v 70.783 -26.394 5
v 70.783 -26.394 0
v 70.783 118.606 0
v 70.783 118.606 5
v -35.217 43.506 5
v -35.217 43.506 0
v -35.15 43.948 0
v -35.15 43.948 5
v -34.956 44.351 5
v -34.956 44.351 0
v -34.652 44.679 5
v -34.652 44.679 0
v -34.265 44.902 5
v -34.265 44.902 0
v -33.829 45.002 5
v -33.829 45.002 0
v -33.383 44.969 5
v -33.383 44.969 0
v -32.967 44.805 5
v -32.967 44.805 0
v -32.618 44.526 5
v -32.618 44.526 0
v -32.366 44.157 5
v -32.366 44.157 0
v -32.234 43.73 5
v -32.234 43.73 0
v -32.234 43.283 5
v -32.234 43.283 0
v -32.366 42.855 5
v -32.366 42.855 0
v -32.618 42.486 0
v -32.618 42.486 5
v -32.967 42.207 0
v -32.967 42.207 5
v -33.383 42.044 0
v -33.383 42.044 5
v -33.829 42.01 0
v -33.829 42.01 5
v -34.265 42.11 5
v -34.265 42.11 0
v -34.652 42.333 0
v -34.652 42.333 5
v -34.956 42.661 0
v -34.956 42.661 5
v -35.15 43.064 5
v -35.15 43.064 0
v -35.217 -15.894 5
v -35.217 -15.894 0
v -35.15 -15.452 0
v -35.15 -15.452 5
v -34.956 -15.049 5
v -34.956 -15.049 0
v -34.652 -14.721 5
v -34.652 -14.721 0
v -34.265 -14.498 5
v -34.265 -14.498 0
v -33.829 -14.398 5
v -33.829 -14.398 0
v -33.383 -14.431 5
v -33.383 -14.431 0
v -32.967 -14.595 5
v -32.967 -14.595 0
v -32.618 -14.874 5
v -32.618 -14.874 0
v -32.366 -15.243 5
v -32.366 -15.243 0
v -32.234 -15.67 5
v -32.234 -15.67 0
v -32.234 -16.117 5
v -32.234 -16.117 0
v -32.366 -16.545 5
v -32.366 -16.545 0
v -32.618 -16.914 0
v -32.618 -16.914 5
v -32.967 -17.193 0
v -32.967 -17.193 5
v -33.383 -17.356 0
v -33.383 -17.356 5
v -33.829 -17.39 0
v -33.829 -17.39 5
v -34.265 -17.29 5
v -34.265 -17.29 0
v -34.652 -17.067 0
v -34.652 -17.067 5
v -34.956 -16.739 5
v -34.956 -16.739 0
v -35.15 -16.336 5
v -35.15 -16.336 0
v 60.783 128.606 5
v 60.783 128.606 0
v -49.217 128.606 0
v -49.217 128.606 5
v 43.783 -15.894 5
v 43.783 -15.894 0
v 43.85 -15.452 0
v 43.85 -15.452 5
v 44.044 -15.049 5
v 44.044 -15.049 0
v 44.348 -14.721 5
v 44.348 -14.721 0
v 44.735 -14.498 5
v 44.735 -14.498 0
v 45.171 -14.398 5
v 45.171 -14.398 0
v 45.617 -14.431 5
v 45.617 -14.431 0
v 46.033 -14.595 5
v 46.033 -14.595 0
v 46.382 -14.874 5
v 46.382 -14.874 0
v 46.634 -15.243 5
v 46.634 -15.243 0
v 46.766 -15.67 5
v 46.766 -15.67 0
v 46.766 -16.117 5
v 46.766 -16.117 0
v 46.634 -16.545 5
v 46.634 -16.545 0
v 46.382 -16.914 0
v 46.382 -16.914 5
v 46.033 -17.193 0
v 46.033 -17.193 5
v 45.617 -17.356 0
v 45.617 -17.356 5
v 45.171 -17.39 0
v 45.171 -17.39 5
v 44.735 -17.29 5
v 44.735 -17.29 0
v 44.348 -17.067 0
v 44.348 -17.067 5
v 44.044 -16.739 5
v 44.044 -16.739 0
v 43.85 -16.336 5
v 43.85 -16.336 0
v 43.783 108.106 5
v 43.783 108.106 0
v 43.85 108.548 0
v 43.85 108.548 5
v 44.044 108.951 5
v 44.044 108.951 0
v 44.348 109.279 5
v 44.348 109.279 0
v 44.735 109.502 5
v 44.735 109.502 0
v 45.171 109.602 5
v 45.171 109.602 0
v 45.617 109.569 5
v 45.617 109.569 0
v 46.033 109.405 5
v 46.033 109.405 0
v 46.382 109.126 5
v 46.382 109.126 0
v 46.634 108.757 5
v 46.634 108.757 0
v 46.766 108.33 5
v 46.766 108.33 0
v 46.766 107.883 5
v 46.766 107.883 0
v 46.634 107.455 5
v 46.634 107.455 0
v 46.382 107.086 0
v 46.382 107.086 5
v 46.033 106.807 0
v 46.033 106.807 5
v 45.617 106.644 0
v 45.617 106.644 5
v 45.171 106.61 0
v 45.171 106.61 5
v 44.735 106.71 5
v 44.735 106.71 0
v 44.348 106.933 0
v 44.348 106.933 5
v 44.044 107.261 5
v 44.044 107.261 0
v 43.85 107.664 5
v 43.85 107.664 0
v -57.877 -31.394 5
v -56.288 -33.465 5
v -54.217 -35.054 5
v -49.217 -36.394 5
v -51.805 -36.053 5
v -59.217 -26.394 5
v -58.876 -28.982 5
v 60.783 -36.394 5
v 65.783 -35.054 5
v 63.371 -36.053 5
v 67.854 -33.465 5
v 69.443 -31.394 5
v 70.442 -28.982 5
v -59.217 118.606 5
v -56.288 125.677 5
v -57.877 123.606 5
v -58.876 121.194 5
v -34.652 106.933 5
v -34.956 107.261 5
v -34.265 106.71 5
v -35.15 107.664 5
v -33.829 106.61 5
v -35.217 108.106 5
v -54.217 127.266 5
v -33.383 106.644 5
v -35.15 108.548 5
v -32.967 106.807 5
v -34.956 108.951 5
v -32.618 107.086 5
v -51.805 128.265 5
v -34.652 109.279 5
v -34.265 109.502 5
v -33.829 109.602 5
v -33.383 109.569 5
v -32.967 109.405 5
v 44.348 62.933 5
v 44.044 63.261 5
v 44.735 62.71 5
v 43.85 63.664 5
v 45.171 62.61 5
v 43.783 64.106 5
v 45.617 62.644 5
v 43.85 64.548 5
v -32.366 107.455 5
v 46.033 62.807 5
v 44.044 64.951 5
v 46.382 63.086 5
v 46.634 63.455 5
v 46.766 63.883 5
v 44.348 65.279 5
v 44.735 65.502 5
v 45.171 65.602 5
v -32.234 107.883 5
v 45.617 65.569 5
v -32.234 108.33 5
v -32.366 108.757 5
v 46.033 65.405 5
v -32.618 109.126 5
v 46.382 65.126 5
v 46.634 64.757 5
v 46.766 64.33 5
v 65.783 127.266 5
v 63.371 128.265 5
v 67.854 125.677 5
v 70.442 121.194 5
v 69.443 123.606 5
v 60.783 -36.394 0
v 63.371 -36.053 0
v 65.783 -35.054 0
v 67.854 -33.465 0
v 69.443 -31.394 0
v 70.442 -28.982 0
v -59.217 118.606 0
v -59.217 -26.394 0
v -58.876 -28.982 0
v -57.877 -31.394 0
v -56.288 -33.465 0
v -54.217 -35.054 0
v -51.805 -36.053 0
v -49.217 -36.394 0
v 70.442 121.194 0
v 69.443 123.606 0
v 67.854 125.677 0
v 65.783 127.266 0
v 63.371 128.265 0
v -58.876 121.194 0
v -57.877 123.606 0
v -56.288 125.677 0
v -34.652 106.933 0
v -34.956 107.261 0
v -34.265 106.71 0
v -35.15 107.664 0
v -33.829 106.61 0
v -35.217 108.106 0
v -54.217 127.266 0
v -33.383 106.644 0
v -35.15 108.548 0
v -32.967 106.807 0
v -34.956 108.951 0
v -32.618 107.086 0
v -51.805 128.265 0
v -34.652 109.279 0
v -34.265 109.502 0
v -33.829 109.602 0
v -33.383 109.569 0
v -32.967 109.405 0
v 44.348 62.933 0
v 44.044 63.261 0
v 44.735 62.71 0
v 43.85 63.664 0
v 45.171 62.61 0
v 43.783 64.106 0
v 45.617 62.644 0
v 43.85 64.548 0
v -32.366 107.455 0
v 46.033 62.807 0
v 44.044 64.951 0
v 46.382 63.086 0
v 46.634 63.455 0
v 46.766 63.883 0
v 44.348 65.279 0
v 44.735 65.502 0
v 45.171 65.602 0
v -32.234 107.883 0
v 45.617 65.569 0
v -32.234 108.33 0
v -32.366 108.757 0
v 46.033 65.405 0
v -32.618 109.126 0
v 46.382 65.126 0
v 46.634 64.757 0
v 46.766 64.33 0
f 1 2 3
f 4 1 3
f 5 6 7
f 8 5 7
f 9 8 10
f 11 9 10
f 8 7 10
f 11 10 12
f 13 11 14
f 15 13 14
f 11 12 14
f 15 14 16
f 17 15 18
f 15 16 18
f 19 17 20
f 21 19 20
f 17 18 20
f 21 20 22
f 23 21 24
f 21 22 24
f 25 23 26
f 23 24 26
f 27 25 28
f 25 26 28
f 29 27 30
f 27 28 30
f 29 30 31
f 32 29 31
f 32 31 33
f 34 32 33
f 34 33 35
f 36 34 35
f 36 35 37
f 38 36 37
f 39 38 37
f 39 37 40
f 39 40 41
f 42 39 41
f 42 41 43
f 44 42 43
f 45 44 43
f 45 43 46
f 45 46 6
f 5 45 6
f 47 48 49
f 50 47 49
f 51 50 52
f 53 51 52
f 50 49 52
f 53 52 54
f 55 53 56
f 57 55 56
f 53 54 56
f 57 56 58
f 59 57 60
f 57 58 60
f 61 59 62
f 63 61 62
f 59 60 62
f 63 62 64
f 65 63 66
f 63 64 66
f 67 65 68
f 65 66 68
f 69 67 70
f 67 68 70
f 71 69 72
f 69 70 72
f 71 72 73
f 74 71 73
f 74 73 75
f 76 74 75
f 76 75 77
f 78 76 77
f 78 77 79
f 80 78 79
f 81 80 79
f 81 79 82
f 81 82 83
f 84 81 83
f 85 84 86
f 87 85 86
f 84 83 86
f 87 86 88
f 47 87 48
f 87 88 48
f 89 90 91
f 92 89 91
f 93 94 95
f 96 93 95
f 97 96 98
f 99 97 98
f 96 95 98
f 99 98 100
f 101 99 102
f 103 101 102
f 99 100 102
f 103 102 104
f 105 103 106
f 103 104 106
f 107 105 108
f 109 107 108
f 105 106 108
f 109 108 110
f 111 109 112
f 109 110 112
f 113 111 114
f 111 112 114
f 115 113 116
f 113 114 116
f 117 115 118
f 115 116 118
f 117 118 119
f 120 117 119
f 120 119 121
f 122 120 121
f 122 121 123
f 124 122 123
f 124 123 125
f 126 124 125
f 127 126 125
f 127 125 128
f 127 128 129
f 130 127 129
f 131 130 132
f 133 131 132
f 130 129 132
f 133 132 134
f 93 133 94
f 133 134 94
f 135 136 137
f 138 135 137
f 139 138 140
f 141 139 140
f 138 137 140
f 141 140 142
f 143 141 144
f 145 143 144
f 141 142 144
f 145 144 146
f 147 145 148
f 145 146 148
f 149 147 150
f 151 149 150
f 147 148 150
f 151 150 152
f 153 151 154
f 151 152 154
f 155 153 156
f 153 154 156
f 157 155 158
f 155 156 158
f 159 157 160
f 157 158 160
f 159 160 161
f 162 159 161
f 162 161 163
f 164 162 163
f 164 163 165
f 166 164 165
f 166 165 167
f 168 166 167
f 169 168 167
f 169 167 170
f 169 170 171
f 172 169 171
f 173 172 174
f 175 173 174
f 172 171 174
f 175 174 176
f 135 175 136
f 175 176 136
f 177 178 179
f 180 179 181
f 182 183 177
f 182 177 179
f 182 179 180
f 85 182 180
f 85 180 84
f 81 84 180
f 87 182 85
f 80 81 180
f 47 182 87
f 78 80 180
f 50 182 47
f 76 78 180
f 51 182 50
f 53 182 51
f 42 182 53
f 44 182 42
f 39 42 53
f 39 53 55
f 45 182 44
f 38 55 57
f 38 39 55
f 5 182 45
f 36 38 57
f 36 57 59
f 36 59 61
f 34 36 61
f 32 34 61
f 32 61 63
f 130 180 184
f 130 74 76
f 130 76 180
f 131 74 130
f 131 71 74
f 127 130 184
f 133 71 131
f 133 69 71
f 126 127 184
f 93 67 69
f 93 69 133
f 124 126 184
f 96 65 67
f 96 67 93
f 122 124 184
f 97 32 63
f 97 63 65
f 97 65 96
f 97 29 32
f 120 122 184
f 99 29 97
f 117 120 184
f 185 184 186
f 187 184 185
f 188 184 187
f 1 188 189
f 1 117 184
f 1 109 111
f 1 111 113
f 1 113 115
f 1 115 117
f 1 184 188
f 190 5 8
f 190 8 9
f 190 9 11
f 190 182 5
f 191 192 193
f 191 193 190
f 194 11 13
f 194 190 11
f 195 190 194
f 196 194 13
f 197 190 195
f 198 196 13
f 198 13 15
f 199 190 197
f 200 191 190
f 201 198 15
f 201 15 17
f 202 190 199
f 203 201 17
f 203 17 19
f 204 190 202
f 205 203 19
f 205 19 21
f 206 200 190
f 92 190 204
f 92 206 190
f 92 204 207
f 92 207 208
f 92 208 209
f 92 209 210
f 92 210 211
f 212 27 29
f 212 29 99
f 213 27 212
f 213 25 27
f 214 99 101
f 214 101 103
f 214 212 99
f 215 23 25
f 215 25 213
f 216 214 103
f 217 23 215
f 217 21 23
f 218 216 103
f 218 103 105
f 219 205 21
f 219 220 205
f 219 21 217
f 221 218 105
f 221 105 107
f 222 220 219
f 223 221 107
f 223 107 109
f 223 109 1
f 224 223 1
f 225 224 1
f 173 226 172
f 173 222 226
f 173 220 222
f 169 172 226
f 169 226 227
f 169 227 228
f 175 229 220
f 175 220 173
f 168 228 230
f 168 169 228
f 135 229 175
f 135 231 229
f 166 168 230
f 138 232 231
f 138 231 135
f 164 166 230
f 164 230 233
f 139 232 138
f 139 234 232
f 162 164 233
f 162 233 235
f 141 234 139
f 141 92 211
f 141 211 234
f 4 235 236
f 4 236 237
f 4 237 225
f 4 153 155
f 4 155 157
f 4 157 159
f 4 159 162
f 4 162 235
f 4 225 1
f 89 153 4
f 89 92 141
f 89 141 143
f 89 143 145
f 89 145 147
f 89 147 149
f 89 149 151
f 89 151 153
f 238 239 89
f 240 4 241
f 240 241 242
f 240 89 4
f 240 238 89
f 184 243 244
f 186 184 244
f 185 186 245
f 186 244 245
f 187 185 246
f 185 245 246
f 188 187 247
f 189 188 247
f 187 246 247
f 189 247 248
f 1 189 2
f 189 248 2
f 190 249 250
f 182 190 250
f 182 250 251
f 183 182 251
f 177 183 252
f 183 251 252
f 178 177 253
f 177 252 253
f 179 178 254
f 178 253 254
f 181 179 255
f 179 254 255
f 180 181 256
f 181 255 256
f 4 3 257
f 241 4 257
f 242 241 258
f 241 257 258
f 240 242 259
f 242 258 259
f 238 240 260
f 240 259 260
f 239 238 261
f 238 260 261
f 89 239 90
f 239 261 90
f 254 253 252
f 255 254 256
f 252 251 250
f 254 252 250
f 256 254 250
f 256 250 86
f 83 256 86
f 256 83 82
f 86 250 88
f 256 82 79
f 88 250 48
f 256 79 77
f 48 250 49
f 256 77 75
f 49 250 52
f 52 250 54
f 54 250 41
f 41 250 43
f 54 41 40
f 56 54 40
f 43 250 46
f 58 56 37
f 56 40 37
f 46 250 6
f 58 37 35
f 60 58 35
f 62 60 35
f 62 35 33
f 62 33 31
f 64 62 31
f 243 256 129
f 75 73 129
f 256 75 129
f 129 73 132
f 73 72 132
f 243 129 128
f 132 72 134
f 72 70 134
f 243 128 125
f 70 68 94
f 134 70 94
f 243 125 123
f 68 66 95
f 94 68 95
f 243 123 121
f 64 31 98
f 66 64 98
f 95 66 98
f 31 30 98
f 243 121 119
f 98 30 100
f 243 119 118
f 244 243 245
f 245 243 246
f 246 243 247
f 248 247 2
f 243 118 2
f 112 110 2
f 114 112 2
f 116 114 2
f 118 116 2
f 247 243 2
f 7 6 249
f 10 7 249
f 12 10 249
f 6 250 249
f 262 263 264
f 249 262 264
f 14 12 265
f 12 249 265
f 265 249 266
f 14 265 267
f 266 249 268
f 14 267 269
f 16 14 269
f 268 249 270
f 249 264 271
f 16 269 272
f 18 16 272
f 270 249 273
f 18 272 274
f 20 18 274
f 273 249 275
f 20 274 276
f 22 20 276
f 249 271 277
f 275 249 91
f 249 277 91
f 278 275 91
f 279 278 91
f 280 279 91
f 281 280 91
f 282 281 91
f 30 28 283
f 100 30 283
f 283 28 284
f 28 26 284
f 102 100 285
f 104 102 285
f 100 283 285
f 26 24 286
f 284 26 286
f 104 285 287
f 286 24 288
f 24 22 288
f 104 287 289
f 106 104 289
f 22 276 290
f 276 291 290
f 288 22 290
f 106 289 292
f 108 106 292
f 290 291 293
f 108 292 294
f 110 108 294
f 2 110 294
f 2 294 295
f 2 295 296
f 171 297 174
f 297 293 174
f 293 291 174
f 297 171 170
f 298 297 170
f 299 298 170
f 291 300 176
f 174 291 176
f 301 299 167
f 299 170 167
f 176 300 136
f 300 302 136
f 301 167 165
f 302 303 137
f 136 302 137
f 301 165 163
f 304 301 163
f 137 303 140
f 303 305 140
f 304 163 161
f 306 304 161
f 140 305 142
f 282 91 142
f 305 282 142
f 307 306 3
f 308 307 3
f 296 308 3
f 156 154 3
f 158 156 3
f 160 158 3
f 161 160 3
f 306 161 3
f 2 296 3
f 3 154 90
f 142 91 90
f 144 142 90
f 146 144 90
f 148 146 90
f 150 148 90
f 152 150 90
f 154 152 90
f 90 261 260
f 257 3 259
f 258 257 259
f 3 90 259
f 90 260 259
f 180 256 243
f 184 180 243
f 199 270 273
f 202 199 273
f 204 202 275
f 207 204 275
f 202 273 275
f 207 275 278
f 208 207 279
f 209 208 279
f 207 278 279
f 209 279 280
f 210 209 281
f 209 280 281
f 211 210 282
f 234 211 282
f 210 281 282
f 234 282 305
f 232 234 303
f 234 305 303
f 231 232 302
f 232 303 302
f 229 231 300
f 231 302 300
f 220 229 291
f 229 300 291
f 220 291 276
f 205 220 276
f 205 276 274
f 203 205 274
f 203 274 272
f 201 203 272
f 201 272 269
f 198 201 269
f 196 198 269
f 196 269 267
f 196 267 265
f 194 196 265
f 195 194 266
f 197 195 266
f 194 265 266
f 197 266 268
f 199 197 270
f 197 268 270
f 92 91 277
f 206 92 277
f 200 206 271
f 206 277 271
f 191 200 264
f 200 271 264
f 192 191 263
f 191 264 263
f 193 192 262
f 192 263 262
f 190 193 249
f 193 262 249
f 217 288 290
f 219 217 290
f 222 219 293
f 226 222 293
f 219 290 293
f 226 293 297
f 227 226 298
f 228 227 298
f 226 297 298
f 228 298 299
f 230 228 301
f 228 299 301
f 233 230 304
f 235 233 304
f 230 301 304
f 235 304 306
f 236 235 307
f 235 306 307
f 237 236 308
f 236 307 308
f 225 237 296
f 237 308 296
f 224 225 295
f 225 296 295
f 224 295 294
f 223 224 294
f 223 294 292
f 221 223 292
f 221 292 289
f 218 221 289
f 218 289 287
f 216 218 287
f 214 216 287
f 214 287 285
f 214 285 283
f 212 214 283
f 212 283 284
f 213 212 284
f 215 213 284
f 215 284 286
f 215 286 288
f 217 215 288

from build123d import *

# Parameters (mm, degrees)
RESSALTO_EXTRUS_O1_DEPTH = 5
ESBO_O2_R                = 1.5
CORTE_EXTRUS_O1_DEPTH    = 5
ESBO_O3_R                = 1.5
CORTE_EXTRUS_O2_DEPTH    = 6
ESBO_O9_R                = 1.5
CORTE_EXTRUS_O7_DEPTH    = 10


with BuildPart() as part:
    # Esboço1 → Ressalto-extrusão1 (new body)
    with BuildSketch(Plane.XY):
        with BuildLine():
            Line((-49.217119449, -36.393854661), (60.782880551, -36.393854661))
            ThreePointArc((60.782880551, -36.393854661), (67.853948363, -33.464922473), (70.782880551, -26.393854661))
            Line((70.782880551, -26.393854661), (70.782880551, 118.606145339))
            ThreePointArc((70.782880551, 118.606145339), (67.853948363, 125.67721315), (60.782880551, 128.606145339))
            Line((60.782880551, 128.606145339), (-49.217119449, 128.606145339))
            ThreePointArc((-49.217119449, 128.606145339), (-56.288187261, 125.67721315), (-59.217119449, 118.606145339))
            Line((-59.217119449, 118.606145339), (-59.217119449, -26.393854661))
            ThreePointArc((-59.217119449, -26.393854661), (-56.288187261, -33.464922473), (-49.217119449, -36.393854661))
        make_face()
    extrude(amount=RESSALTO_EXTRUS_O1_DEPTH)

    # Esboço2 → Corte-extrusão1 (cut)
    with BuildSketch(Plane(origin=(0, 0, 0), x_dir=(-1, 0, 0), z_dir=(0, 0, -1))):
        with Locations((33.717119449, -15.893854661)):
            Circle(ESBO_O2_R)
        with Locations((33.717119449, 108.106145339)):
            Circle(ESBO_O2_R)
        with Locations((-45.282880551, -15.893854661)):
            Circle(ESBO_O2_R)
        with Locations((-45.282880551, 108.106145339)):
            Circle(ESBO_O2_R)
    extrude(amount=-CORTE_EXTRUS_O1_DEPTH, mode=Mode.SUBTRACT)

    # Esboço3 → Corte-extrusão2 (cut, through all)
    with BuildSketch(Plane(origin=(0, 0, 0), x_dir=(-1, 0, 0), z_dir=(0, 0, -1))):
        with Locations((33.717119449, 43.506145339)):
            Circle(ESBO_O3_R)
    extrude(amount=-CORTE_EXTRUS_O2_DEPTH, mode=Mode.SUBTRACT)

    # Esboço9 → Corte-extrusão7 (cut)
    with BuildSketch(Plane(origin=(0, 0, 0), x_dir=(-1, 0, 0), z_dir=(0, 0, -1))):
        with Locations((-45.282880551, 64.106145339)):
            Circle(ESBO_O9_R)
    extrude(amount=-CORTE_EXTRUS_O7_DEPTH, mode=Mode.SUBTRACT)


solid = part.part
